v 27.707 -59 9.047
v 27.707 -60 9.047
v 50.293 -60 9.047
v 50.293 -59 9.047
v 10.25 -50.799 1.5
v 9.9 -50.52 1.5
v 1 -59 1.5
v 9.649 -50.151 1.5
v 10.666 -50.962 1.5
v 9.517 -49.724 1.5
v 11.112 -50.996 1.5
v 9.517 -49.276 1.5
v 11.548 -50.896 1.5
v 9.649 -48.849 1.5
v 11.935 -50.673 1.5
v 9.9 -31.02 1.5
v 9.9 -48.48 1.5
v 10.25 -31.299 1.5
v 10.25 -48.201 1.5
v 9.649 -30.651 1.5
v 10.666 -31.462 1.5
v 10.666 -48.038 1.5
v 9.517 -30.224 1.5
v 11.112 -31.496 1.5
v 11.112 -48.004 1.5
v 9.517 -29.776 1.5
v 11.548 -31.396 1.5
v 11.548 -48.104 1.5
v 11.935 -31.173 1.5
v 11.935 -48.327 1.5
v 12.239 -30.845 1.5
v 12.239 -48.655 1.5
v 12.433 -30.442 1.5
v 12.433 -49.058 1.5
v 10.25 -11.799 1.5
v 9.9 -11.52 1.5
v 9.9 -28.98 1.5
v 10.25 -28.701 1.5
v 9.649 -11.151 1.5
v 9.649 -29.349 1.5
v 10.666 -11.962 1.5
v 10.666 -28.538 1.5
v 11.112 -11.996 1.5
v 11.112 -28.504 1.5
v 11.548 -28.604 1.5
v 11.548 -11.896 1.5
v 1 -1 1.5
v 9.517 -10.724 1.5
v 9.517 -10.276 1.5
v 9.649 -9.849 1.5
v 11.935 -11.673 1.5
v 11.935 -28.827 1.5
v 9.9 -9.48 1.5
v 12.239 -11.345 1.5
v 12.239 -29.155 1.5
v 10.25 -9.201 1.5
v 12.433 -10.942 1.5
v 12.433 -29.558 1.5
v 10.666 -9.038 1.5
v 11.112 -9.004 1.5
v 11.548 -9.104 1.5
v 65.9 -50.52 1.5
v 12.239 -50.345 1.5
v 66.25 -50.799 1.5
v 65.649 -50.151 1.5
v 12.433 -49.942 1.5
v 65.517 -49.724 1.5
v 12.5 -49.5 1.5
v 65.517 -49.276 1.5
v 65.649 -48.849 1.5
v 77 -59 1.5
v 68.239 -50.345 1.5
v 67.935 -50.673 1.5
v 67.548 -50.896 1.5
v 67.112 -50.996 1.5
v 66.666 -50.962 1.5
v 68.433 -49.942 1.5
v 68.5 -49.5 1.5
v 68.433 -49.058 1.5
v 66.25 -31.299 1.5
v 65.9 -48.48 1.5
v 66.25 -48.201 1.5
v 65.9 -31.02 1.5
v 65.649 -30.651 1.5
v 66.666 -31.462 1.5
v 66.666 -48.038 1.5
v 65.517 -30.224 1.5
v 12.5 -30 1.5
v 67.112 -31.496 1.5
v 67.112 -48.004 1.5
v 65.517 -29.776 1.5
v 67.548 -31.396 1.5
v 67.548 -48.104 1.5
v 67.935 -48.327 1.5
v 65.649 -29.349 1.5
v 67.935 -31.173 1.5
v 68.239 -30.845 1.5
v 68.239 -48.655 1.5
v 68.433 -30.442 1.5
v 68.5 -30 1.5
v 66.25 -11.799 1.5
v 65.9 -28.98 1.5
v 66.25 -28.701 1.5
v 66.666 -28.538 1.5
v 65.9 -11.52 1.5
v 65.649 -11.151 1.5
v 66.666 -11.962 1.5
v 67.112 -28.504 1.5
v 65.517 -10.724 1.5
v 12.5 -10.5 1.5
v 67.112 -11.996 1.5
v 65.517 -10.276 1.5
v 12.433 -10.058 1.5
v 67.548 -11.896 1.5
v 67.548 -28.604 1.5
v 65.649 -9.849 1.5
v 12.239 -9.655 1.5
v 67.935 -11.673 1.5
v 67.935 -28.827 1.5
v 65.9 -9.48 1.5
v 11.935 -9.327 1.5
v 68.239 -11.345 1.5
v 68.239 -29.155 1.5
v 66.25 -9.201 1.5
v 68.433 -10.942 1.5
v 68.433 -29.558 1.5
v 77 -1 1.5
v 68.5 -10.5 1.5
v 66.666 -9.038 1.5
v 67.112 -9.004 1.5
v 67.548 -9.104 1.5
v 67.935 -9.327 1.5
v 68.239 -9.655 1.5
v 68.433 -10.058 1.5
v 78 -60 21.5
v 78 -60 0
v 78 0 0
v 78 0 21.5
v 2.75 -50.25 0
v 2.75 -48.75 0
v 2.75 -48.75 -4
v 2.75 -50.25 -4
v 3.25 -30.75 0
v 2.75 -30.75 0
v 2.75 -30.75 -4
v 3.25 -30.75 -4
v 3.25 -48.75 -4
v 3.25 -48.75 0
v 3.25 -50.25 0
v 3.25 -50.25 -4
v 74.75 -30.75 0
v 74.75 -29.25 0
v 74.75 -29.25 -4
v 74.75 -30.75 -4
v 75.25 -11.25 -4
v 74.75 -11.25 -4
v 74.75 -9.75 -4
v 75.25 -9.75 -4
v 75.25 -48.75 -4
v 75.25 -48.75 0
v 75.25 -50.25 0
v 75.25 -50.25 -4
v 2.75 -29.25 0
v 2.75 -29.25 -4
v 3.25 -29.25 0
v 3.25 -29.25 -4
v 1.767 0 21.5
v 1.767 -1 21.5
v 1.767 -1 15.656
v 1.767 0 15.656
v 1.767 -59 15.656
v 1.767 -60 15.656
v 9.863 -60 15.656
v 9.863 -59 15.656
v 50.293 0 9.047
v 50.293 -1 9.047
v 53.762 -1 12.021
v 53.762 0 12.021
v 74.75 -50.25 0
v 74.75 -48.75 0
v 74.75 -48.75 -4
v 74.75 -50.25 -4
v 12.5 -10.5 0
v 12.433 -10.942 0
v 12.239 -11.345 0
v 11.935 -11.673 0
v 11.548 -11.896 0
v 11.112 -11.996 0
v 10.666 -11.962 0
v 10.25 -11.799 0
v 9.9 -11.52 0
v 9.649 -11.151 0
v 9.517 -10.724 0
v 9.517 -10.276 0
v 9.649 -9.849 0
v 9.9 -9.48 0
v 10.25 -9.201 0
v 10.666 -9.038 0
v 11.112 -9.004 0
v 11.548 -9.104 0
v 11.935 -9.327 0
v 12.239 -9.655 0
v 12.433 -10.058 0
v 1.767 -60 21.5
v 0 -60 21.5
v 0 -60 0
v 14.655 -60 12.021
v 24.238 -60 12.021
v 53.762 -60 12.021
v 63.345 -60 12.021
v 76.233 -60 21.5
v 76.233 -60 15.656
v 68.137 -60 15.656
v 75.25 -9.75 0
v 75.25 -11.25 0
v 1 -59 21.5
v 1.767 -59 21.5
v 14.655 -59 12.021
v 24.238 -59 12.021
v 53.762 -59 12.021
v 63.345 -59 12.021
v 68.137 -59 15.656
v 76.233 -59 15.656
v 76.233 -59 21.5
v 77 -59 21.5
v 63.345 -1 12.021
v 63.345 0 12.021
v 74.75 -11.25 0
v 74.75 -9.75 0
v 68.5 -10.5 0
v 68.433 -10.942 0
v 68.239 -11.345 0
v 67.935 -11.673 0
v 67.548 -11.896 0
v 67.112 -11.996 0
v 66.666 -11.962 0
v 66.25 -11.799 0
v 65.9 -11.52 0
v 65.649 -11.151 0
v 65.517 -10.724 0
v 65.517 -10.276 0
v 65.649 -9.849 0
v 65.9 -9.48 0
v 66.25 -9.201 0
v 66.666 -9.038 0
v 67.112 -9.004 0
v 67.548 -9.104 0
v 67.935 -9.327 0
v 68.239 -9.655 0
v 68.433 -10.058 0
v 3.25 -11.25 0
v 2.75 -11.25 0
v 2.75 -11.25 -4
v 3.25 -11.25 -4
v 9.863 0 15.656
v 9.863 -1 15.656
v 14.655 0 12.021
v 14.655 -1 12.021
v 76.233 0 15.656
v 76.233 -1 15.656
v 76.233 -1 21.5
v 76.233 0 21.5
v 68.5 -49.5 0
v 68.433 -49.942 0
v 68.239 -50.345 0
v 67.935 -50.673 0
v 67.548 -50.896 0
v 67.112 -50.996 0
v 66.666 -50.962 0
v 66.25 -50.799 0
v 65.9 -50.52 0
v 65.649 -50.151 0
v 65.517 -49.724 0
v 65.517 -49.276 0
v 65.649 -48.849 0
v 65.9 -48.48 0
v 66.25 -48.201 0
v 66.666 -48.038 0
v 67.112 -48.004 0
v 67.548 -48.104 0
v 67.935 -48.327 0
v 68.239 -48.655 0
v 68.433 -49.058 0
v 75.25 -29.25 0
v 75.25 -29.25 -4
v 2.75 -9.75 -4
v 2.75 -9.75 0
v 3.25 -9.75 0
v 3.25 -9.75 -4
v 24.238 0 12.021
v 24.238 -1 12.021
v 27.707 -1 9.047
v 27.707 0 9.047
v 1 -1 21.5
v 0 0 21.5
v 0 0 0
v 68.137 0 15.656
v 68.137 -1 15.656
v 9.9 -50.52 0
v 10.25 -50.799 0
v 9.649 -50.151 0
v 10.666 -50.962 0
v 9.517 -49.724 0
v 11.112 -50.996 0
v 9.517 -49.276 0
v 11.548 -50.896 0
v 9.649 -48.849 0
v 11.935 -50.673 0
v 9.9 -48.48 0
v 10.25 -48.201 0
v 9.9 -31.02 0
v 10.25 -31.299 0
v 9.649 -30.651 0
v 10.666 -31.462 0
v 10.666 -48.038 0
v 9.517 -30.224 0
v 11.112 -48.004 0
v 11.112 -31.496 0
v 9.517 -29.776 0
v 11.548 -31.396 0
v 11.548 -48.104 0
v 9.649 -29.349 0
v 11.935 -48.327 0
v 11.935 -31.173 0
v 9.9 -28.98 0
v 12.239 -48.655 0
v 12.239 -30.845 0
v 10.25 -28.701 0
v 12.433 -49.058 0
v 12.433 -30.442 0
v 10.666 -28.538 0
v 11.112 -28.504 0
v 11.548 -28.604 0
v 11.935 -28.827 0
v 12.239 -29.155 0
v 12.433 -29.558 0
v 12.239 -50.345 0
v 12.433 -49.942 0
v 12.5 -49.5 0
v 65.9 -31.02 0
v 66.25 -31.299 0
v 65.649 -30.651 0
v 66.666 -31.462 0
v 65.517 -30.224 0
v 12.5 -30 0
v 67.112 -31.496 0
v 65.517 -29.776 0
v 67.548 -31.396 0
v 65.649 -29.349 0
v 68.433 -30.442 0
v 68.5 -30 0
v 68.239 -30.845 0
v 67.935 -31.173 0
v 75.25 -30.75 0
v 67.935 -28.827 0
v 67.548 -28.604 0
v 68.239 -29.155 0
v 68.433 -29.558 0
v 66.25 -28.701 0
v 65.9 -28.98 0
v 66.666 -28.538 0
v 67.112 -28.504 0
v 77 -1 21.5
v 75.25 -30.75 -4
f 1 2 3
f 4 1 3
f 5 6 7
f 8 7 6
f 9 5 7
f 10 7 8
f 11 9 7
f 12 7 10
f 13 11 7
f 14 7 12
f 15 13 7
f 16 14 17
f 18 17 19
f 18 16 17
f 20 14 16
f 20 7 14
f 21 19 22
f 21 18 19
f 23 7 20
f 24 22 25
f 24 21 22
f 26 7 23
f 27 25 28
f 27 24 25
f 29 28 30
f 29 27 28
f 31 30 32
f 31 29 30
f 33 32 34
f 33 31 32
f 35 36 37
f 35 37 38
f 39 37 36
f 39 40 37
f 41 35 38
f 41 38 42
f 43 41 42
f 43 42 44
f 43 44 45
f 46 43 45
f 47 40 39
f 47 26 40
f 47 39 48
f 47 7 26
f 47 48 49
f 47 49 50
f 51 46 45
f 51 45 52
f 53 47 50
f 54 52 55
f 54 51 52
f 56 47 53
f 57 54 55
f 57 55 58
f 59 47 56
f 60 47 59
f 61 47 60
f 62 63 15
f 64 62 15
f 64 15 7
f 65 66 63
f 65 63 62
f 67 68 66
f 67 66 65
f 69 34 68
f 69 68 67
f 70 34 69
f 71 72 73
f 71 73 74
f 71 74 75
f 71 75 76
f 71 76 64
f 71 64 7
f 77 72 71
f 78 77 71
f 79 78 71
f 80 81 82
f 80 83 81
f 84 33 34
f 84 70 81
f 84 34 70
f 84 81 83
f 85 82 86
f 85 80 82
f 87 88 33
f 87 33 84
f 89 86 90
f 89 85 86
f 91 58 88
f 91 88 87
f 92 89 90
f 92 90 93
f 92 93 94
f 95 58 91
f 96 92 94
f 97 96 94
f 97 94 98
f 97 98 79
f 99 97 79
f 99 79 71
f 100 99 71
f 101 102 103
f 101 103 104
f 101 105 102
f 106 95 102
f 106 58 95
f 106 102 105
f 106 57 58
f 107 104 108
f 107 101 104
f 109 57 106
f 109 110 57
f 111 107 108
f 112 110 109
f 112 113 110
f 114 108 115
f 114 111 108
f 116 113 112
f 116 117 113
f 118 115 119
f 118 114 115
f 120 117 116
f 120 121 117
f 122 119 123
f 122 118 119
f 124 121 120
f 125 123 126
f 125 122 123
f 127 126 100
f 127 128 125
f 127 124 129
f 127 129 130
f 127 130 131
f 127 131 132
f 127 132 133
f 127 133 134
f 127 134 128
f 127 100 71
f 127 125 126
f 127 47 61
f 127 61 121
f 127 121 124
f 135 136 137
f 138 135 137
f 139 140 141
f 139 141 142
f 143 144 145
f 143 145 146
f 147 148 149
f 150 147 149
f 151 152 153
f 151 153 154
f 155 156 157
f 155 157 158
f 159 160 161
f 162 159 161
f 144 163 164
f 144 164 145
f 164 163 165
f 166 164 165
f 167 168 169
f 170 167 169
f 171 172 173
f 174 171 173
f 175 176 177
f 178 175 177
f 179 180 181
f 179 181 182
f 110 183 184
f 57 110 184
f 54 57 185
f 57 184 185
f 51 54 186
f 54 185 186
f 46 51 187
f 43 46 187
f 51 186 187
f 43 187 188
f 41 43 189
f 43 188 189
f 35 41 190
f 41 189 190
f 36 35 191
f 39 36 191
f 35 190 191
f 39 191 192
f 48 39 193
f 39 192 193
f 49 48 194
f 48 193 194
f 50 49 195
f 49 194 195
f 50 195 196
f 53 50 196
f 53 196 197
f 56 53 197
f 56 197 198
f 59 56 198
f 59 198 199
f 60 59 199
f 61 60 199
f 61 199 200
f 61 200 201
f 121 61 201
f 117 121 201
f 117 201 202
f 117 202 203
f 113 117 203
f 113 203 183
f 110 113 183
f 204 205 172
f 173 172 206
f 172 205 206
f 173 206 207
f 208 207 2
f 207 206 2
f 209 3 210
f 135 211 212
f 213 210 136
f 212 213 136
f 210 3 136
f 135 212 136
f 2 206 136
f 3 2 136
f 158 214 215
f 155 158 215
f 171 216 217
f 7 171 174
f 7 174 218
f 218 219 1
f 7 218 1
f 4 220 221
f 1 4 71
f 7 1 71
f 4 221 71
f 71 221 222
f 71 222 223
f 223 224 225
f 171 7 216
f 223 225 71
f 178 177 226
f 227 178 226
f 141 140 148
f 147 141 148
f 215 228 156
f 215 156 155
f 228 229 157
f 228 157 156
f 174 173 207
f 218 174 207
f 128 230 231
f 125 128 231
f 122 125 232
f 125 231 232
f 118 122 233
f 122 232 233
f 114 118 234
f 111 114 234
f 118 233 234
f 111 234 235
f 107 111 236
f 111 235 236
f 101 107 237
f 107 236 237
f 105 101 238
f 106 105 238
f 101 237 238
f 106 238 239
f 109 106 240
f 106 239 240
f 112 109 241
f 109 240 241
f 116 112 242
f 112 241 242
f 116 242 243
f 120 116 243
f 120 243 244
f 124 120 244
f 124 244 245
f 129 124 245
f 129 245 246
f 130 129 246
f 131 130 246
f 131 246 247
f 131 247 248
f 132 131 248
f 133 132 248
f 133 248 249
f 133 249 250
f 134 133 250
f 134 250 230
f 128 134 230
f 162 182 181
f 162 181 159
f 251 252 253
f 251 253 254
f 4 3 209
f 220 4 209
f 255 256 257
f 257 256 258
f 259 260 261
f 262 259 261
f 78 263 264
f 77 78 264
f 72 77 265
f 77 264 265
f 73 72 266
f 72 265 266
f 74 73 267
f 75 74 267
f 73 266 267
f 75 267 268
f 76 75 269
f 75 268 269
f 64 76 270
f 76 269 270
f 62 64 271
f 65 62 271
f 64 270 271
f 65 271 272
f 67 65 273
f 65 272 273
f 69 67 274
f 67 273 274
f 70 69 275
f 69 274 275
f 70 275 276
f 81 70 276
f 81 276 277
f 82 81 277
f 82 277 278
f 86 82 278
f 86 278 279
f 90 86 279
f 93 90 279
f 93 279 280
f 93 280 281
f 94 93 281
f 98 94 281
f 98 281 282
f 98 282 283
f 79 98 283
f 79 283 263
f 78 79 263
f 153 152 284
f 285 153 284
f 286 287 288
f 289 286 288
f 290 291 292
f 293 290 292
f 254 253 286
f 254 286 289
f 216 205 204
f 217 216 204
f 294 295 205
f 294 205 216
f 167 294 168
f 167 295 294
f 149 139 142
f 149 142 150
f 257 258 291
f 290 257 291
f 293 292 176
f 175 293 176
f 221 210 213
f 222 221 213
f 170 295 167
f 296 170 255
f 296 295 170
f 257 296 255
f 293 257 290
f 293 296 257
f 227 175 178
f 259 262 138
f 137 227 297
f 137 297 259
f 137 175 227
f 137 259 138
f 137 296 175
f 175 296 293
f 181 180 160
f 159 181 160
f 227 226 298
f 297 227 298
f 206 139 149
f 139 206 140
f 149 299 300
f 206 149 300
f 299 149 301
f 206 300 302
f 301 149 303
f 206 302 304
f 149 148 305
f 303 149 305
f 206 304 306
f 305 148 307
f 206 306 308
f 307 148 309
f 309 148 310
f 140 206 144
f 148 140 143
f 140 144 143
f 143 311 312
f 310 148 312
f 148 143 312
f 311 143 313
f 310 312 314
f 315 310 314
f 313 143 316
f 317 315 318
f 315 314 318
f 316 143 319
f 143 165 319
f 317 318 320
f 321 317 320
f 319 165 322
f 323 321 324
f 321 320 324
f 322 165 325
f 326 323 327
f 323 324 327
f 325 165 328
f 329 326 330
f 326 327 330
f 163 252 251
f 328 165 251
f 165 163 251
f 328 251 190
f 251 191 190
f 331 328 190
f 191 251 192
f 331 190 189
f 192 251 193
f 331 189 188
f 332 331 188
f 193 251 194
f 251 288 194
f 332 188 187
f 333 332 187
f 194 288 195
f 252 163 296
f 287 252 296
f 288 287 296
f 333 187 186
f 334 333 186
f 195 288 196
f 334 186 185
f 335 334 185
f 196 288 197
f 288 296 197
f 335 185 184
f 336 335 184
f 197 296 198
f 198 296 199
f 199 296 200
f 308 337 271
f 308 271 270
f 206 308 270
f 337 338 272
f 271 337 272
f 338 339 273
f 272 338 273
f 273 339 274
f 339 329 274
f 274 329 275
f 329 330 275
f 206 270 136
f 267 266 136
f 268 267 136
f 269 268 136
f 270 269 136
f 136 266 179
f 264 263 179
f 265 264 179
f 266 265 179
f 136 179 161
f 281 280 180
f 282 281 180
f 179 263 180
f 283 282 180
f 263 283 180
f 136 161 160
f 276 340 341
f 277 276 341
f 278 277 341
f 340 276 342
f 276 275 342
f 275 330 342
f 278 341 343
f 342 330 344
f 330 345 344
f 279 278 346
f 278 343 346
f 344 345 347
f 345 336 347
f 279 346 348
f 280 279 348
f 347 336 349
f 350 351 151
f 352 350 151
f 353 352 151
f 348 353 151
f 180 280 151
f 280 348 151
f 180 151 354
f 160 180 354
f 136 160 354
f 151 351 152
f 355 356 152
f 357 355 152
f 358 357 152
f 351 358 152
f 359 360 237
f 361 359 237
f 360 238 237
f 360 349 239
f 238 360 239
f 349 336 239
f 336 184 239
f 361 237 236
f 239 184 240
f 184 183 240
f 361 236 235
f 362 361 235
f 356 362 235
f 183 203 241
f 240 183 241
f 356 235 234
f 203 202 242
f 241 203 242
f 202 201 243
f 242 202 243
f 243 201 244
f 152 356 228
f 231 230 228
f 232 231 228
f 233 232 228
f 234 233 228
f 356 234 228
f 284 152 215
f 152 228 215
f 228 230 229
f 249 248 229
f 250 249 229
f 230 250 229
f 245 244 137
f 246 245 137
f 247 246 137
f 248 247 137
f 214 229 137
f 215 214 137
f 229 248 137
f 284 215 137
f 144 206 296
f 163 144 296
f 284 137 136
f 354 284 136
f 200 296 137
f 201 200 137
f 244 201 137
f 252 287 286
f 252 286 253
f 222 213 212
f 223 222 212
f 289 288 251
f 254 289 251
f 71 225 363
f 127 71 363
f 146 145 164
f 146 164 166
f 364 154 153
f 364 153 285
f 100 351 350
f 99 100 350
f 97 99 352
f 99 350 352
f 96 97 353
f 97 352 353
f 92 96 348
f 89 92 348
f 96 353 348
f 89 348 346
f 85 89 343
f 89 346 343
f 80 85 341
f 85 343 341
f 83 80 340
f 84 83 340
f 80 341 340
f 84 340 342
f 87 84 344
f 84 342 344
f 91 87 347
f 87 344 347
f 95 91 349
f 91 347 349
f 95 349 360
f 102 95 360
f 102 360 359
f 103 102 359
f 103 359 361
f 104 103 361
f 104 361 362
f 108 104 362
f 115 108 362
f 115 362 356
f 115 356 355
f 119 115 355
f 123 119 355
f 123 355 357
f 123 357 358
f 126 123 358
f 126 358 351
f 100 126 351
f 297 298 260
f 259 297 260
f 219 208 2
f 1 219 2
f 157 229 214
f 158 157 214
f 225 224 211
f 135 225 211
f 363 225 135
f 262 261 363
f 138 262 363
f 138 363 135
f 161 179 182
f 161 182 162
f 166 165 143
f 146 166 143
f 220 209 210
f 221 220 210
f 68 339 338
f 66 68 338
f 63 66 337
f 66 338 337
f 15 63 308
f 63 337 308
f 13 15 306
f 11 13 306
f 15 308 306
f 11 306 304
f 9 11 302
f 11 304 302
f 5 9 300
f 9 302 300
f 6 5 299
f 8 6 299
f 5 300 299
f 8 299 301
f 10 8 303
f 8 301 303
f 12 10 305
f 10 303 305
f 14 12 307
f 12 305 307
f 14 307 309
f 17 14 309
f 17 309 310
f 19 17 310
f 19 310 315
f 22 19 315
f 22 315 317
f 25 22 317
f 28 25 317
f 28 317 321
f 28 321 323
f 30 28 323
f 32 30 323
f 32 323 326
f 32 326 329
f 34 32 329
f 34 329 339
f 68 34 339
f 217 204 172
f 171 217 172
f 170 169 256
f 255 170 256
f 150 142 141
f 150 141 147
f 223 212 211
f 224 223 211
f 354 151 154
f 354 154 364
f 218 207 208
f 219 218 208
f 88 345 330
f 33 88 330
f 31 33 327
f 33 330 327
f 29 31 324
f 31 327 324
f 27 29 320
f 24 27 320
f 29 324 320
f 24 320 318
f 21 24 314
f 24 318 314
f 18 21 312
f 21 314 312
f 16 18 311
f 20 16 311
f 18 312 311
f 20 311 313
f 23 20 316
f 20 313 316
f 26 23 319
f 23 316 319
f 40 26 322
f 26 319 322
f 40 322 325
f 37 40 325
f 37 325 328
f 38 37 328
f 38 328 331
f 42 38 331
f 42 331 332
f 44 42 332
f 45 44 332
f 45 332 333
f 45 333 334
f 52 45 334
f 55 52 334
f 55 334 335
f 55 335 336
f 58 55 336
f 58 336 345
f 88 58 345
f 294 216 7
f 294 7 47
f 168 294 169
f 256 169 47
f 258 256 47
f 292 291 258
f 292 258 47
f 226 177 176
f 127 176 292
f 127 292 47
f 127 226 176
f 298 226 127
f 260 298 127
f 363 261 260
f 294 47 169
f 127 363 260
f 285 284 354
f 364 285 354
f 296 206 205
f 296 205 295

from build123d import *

# Parameters (mm, degrees)
F0_W     = 78
F0_H     = 60
F1_DEPTH = 21.5
F2_W     = 76
F2_H     = 58
F3_DEPTH = 20
F5_DEPTH = 60.001
F6_W     = 0.5
F6_H     = 1.5
F7_DEPTH = 4
F8_R     = 1.5
F9_DEPTH = 25


with BuildPart() as f1:
    # F0 (on Top) → F1 (new body)
    with BuildSketch(Plane.XY):
        with Locations((39, -30)):
            Rectangle(F0_W, F0_H)
    extrude(amount=F1_DEPTH)

    # F2 (on face) → F3 (cut)
    with BuildSketch(Plane.XY.offset(21.5)):
        with Locations((39, -30)):
            Rectangle(F2_W, F2_H)
    extrude(amount=-F3_DEPTH, mode=Mode.SUBTRACT)

    # F4 (on face) → F5 (cut, through all)
    with BuildSketch(Plane.XZ.offset(60)):
        Polygon((27.707402, 9.04668), (39, 9.04668), (50.292598, 9.04668), (53.762321, 12.020729), (63.345369, 12.020729), (68.136893, 15.65568), (76.232917, 15.65568), (76.232917, 21.5), (1.767083, 21.5), (1.767083, 15.65568), (9.863107, 15.65568), (14.654631, 12.020729), (24.237679, 12.020729), align=None)
    extrude(amount=-F5_DEPTH, mode=Mode.SUBTRACT)

    # F6 (on face) → F7 (join)
    with BuildSketch(Plane(origin=(0, 0, 0), x_dir=(1, 0, 0), z_dir=(0, 0, -1))):
        with Locations((75, 10.5)):
            Rectangle(F6_W, F6_H)
        with Locations((75, 30)):
            Rectangle(F6_W, F6_H)
        with Locations((75, 49.5)):
            Rectangle(F6_W, F6_H)
        with Locations((3, 10.5)):
            Rectangle(F6_W, F6_H)
        with Locations((3, 49.5)):
            Rectangle(F6_W, F6_H)
        with Locations((3, 30)):
            Rectangle(F6_W, F6_H)
    extrude(amount=F7_DEPTH)

    # F8 (on face) → F9 (cut)
    with BuildSketch(Plane(origin=(0, 0, 0), x_dir=(1, 0, 0), z_dir=(0, 0, -1))):
        with BuildLine():
            ThreePointArc((65.5, 10.5), (67, 9), (68.5, 10.5))
            Line((68.5, 10.5), (65.5, 10.5))
        make_face()
        with BuildLine():
            Line((65.5, 10.5), (68.5, 10.5))
            ThreePointArc((68.5, 10.5), (67, 12), (65.5, 10.5))
        make_face()
        with BuildLine():
            ThreePointArc((9.5, 10.5), (11, 9), (12.5, 10.5))
            Line((12.5, 10.5), (9.5, 10.5))
        make_face()
        with BuildLine():
            Line((9.5, 10.5), (12.5, 10.5))
            ThreePointArc((12.5, 10.5), (11, 12), (9.5, 10.5))
        make_face()
        with BuildLine():
            ThreePointArc((65.5, 30), (67, 28.5), (68.5, 30))
            Line((68.5, 30), (65.5, 30))
        make_face()
        with BuildLine():
            Line((65.5, 30), (68.5, 30))
            ThreePointArc((68.5, 30), (67, 31.5), (65.5, 30))
        make_face()
        with BuildLine():
            ThreePointArc((9.5, 30), (11, 28.5), (12.5, 30))
            Line((12.5, 30), (9.5, 30))
        make_face()
        with BuildLine():
            Line((9.5, 30), (12.5, 30))
            ThreePointArc((12.5, 30), (11, 31.5), (9.5, 30))
        make_face()
        with Locations((67, 49.5)):
            Circle(F8_R)
        with Locations((11, 49.5)):
            Circle(F8_R)
    extrude(amount=-F9_DEPTH, mode=Mode.SUBTRACT)


solid = f1.part
